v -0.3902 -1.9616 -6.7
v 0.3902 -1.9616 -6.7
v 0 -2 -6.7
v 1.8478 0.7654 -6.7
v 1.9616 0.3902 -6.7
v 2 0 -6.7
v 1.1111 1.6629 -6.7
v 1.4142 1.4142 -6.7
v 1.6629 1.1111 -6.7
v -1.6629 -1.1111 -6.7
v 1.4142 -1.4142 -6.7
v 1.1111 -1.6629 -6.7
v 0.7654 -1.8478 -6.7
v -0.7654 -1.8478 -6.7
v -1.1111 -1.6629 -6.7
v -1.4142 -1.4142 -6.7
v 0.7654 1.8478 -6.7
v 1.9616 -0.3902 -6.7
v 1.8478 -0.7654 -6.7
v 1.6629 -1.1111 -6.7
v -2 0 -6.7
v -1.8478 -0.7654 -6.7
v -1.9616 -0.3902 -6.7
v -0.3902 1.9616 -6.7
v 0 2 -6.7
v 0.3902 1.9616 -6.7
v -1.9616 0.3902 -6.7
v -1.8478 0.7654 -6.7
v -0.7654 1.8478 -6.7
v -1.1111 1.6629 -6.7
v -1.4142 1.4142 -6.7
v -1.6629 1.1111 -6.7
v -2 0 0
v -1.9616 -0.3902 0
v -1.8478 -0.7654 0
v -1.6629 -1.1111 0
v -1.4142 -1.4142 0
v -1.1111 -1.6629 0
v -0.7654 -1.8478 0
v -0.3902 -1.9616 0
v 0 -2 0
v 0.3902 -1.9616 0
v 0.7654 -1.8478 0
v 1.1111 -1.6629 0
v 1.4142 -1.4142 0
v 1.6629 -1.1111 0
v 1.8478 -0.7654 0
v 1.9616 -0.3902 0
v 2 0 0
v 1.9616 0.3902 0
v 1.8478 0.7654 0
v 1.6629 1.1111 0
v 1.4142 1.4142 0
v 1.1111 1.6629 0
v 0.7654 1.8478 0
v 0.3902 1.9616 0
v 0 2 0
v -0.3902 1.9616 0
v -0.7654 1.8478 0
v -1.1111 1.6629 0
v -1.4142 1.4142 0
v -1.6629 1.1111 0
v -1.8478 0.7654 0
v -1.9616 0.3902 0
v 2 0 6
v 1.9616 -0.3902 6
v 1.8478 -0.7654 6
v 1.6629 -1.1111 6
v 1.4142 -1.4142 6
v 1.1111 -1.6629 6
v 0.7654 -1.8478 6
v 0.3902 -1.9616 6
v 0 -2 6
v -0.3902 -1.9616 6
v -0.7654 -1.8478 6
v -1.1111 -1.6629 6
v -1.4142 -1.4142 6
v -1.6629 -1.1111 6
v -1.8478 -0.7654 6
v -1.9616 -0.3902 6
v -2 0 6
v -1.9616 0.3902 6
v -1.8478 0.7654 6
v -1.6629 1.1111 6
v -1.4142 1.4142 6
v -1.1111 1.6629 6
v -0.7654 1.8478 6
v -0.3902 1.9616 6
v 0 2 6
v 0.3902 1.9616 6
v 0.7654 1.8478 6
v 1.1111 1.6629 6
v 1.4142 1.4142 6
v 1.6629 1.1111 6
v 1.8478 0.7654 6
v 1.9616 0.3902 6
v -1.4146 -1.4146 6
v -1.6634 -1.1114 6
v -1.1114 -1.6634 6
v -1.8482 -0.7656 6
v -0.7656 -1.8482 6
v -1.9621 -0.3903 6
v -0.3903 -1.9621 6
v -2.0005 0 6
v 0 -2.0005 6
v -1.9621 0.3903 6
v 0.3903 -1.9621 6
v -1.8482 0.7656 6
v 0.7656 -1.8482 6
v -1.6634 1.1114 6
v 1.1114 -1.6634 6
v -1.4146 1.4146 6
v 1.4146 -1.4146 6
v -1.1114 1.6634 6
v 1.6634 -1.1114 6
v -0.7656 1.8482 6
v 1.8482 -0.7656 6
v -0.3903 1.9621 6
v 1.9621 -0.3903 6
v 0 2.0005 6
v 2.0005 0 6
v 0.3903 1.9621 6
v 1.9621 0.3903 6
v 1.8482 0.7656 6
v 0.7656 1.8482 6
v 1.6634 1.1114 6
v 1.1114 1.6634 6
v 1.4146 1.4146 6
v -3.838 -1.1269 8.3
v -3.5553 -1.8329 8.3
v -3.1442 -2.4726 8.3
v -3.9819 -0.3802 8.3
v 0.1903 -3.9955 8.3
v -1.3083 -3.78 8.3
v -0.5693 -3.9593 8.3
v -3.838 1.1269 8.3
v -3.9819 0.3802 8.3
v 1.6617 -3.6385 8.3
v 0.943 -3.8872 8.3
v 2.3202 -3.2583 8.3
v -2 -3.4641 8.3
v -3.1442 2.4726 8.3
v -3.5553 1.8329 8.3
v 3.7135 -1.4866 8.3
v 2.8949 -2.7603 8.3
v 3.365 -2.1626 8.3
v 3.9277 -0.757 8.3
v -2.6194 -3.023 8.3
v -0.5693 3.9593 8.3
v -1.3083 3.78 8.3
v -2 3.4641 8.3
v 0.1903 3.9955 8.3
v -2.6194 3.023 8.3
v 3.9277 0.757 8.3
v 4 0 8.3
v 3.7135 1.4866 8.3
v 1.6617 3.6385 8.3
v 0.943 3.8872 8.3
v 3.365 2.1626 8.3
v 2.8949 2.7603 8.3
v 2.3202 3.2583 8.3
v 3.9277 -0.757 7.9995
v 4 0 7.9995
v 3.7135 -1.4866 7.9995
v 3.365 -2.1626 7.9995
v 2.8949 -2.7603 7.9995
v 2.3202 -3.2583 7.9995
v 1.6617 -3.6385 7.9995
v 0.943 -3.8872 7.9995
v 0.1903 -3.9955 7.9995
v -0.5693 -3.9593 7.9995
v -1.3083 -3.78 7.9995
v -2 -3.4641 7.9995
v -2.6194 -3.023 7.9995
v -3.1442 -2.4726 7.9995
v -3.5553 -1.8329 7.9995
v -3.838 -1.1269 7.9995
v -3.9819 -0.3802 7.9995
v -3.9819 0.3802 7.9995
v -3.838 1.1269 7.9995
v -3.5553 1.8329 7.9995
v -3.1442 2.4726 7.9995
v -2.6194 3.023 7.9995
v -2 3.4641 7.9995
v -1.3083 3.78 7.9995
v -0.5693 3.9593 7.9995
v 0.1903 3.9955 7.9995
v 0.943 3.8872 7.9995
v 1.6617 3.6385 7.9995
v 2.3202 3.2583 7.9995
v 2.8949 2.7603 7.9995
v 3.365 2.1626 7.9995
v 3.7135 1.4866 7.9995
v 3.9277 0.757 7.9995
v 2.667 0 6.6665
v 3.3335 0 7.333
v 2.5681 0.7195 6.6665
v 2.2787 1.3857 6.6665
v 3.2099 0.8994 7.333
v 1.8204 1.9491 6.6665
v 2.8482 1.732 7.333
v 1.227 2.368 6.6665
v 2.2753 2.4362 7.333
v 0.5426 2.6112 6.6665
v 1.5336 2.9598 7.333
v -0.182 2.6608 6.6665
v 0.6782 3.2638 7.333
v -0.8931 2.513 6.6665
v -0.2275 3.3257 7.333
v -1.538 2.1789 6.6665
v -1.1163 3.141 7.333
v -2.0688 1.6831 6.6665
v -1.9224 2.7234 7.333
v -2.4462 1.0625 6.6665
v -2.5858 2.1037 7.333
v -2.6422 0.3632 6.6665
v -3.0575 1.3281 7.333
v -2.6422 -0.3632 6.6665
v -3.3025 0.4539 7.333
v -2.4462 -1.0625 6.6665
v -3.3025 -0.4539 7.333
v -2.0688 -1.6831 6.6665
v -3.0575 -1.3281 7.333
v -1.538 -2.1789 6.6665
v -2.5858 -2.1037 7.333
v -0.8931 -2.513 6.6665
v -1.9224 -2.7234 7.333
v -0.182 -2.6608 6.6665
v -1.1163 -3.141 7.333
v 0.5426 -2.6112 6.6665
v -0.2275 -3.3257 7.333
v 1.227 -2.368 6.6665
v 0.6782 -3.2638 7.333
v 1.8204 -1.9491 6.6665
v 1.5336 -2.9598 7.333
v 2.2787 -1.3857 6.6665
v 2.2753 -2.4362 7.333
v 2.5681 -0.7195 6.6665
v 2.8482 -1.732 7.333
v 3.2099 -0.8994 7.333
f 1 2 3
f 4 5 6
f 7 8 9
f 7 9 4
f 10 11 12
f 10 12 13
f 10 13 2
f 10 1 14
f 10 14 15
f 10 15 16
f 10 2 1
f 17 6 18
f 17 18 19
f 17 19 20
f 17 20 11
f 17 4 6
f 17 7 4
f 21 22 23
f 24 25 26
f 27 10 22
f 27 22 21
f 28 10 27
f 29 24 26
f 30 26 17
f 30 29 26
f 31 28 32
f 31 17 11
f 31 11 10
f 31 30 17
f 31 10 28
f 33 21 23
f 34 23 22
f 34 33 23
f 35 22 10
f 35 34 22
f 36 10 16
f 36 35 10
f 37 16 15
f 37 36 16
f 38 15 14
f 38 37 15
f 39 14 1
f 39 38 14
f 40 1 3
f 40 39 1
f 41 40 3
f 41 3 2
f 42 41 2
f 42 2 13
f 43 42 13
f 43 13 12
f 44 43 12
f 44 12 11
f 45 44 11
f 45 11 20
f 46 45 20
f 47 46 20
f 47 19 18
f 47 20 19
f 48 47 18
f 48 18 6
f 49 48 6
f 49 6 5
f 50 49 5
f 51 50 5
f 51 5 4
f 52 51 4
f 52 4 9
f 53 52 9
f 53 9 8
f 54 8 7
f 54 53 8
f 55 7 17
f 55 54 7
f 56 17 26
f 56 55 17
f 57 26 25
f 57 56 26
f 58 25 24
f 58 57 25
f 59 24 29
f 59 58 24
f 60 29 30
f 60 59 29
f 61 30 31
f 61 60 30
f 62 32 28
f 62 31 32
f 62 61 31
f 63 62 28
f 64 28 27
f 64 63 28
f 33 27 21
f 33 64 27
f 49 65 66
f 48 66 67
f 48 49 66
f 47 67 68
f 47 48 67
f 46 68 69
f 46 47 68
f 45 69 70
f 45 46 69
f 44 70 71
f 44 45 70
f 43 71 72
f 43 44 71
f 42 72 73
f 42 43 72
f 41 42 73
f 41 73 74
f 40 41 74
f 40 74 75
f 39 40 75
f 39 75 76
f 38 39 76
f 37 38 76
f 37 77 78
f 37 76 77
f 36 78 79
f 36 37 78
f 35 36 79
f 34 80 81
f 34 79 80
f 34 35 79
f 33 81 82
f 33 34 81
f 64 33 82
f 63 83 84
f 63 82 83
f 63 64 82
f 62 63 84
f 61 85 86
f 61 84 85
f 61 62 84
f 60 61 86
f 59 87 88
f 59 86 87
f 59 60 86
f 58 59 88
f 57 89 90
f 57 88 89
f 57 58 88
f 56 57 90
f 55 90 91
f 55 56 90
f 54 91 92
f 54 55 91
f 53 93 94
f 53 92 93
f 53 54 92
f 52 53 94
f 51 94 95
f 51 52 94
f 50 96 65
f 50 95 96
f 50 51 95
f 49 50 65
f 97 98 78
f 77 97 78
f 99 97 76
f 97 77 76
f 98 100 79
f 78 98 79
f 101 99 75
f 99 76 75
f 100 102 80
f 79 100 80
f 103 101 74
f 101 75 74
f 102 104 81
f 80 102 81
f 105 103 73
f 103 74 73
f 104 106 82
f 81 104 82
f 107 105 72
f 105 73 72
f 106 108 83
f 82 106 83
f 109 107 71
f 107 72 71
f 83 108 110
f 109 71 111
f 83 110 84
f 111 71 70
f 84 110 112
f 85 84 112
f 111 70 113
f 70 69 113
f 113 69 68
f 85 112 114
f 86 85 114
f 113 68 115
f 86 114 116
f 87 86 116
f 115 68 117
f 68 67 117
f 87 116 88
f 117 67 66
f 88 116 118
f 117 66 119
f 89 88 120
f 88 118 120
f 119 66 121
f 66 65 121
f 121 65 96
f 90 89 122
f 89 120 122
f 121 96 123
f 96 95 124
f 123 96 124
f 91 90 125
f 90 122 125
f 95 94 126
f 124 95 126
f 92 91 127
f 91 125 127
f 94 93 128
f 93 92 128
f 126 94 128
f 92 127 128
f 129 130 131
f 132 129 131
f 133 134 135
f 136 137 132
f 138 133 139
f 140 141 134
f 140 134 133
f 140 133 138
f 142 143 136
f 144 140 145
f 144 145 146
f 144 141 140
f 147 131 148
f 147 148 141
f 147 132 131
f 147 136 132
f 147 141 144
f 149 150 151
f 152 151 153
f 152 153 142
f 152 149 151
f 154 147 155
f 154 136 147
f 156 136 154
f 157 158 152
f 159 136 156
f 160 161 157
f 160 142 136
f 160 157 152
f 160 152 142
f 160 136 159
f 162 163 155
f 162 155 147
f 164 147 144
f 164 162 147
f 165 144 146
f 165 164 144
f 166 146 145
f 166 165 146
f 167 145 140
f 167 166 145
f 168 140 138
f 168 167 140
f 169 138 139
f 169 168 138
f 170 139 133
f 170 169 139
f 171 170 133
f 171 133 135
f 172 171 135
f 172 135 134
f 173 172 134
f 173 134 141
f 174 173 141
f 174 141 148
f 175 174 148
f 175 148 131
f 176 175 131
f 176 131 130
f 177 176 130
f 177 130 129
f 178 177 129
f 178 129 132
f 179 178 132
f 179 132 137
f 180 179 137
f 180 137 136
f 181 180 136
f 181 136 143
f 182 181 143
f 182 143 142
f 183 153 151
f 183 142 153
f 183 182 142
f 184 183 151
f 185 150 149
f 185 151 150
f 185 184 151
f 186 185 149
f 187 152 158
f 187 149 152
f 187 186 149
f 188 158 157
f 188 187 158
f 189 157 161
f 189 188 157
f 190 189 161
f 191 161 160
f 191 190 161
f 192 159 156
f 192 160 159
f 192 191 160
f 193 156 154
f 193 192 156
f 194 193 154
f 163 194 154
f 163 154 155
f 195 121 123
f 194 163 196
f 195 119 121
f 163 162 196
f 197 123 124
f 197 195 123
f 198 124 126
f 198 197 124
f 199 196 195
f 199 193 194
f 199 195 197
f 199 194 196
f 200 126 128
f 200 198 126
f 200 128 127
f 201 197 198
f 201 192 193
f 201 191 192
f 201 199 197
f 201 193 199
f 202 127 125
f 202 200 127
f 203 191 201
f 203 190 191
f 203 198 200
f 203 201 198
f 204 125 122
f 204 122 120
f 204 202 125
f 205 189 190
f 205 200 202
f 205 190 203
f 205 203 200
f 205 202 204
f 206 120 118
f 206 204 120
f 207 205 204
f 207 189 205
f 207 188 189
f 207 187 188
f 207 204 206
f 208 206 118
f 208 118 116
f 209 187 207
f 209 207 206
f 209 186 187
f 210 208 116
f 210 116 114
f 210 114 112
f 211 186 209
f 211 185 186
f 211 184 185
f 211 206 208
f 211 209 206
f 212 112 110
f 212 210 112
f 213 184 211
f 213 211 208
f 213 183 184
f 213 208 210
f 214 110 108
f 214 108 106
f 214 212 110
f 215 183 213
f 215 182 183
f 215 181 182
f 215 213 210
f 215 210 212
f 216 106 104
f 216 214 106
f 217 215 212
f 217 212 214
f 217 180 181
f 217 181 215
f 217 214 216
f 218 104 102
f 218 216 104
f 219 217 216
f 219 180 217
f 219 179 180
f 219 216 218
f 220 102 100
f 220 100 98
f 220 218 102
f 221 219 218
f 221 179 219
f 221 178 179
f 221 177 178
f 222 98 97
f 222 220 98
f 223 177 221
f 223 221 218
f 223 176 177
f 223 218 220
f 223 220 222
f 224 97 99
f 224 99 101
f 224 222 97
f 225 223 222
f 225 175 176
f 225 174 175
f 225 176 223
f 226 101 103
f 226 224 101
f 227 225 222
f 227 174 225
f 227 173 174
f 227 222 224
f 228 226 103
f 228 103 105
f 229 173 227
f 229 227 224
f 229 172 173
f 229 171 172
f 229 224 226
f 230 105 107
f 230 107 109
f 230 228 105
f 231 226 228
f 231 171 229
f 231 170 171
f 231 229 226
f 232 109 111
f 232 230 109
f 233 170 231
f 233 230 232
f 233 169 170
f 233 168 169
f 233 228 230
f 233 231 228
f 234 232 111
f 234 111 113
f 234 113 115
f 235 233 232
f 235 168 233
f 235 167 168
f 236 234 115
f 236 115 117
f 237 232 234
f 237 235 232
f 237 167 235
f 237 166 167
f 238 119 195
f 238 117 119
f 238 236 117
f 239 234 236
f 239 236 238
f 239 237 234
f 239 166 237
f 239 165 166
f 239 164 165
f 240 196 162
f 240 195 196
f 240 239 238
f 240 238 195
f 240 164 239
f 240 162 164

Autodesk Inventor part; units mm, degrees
ref_plane "YZ Plane" through (0, 0, 0) normal (1, 0, 0) x (0, 1, 0)
ref_plane "XZ Plane" through (0, 0, 0) normal (0, 1, 0) x (-1, 0, 0)
ref_plane "XY Plane" through (0, 0, 0) normal (0, 0, 1) x (1, 0, 0)
sketch "スケッチ1" plane through (0, 0, 0) normal (0, 0, 1) x (1, 0, 0)
  circle A0 centre (0, 0) radius 2
  dimension "d0" = 4
extrude "押し出し1" add sketch "スケッチ1" along normal blind 6
sketch "スケッチ2" plane through (0, 0, 6) normal (0, 0, 1) x (1, 0, 0)
  circle A0 centre (0, 0) radius 2 projected
  circle A1 centre (0, 0) radius 4
  dimension "d3" = 8
extrude "押し出し2" add sketch "スケッチ2" along normal blind 2.3 contours A0 | A1
thread "ねじ1" size "M4x0.7" class "6g" standard "ANSI Metric M Profile" full length
chamfer "面取り1" distance 2 angle 45 1 edges at (-4, 0, 6)
sketch "スケッチ4" plane through (0, 0, 0) normal (0, 0, -1) x (-1, 0, 0)
  circle A0 centre (0, 0) radius 2
extrude "押し出し4" add sketch "スケッチ4" along normal blind 6.7
properties part number "SB　M4 15mm 皿ネジ" material "Stainless Steel, 440C"
